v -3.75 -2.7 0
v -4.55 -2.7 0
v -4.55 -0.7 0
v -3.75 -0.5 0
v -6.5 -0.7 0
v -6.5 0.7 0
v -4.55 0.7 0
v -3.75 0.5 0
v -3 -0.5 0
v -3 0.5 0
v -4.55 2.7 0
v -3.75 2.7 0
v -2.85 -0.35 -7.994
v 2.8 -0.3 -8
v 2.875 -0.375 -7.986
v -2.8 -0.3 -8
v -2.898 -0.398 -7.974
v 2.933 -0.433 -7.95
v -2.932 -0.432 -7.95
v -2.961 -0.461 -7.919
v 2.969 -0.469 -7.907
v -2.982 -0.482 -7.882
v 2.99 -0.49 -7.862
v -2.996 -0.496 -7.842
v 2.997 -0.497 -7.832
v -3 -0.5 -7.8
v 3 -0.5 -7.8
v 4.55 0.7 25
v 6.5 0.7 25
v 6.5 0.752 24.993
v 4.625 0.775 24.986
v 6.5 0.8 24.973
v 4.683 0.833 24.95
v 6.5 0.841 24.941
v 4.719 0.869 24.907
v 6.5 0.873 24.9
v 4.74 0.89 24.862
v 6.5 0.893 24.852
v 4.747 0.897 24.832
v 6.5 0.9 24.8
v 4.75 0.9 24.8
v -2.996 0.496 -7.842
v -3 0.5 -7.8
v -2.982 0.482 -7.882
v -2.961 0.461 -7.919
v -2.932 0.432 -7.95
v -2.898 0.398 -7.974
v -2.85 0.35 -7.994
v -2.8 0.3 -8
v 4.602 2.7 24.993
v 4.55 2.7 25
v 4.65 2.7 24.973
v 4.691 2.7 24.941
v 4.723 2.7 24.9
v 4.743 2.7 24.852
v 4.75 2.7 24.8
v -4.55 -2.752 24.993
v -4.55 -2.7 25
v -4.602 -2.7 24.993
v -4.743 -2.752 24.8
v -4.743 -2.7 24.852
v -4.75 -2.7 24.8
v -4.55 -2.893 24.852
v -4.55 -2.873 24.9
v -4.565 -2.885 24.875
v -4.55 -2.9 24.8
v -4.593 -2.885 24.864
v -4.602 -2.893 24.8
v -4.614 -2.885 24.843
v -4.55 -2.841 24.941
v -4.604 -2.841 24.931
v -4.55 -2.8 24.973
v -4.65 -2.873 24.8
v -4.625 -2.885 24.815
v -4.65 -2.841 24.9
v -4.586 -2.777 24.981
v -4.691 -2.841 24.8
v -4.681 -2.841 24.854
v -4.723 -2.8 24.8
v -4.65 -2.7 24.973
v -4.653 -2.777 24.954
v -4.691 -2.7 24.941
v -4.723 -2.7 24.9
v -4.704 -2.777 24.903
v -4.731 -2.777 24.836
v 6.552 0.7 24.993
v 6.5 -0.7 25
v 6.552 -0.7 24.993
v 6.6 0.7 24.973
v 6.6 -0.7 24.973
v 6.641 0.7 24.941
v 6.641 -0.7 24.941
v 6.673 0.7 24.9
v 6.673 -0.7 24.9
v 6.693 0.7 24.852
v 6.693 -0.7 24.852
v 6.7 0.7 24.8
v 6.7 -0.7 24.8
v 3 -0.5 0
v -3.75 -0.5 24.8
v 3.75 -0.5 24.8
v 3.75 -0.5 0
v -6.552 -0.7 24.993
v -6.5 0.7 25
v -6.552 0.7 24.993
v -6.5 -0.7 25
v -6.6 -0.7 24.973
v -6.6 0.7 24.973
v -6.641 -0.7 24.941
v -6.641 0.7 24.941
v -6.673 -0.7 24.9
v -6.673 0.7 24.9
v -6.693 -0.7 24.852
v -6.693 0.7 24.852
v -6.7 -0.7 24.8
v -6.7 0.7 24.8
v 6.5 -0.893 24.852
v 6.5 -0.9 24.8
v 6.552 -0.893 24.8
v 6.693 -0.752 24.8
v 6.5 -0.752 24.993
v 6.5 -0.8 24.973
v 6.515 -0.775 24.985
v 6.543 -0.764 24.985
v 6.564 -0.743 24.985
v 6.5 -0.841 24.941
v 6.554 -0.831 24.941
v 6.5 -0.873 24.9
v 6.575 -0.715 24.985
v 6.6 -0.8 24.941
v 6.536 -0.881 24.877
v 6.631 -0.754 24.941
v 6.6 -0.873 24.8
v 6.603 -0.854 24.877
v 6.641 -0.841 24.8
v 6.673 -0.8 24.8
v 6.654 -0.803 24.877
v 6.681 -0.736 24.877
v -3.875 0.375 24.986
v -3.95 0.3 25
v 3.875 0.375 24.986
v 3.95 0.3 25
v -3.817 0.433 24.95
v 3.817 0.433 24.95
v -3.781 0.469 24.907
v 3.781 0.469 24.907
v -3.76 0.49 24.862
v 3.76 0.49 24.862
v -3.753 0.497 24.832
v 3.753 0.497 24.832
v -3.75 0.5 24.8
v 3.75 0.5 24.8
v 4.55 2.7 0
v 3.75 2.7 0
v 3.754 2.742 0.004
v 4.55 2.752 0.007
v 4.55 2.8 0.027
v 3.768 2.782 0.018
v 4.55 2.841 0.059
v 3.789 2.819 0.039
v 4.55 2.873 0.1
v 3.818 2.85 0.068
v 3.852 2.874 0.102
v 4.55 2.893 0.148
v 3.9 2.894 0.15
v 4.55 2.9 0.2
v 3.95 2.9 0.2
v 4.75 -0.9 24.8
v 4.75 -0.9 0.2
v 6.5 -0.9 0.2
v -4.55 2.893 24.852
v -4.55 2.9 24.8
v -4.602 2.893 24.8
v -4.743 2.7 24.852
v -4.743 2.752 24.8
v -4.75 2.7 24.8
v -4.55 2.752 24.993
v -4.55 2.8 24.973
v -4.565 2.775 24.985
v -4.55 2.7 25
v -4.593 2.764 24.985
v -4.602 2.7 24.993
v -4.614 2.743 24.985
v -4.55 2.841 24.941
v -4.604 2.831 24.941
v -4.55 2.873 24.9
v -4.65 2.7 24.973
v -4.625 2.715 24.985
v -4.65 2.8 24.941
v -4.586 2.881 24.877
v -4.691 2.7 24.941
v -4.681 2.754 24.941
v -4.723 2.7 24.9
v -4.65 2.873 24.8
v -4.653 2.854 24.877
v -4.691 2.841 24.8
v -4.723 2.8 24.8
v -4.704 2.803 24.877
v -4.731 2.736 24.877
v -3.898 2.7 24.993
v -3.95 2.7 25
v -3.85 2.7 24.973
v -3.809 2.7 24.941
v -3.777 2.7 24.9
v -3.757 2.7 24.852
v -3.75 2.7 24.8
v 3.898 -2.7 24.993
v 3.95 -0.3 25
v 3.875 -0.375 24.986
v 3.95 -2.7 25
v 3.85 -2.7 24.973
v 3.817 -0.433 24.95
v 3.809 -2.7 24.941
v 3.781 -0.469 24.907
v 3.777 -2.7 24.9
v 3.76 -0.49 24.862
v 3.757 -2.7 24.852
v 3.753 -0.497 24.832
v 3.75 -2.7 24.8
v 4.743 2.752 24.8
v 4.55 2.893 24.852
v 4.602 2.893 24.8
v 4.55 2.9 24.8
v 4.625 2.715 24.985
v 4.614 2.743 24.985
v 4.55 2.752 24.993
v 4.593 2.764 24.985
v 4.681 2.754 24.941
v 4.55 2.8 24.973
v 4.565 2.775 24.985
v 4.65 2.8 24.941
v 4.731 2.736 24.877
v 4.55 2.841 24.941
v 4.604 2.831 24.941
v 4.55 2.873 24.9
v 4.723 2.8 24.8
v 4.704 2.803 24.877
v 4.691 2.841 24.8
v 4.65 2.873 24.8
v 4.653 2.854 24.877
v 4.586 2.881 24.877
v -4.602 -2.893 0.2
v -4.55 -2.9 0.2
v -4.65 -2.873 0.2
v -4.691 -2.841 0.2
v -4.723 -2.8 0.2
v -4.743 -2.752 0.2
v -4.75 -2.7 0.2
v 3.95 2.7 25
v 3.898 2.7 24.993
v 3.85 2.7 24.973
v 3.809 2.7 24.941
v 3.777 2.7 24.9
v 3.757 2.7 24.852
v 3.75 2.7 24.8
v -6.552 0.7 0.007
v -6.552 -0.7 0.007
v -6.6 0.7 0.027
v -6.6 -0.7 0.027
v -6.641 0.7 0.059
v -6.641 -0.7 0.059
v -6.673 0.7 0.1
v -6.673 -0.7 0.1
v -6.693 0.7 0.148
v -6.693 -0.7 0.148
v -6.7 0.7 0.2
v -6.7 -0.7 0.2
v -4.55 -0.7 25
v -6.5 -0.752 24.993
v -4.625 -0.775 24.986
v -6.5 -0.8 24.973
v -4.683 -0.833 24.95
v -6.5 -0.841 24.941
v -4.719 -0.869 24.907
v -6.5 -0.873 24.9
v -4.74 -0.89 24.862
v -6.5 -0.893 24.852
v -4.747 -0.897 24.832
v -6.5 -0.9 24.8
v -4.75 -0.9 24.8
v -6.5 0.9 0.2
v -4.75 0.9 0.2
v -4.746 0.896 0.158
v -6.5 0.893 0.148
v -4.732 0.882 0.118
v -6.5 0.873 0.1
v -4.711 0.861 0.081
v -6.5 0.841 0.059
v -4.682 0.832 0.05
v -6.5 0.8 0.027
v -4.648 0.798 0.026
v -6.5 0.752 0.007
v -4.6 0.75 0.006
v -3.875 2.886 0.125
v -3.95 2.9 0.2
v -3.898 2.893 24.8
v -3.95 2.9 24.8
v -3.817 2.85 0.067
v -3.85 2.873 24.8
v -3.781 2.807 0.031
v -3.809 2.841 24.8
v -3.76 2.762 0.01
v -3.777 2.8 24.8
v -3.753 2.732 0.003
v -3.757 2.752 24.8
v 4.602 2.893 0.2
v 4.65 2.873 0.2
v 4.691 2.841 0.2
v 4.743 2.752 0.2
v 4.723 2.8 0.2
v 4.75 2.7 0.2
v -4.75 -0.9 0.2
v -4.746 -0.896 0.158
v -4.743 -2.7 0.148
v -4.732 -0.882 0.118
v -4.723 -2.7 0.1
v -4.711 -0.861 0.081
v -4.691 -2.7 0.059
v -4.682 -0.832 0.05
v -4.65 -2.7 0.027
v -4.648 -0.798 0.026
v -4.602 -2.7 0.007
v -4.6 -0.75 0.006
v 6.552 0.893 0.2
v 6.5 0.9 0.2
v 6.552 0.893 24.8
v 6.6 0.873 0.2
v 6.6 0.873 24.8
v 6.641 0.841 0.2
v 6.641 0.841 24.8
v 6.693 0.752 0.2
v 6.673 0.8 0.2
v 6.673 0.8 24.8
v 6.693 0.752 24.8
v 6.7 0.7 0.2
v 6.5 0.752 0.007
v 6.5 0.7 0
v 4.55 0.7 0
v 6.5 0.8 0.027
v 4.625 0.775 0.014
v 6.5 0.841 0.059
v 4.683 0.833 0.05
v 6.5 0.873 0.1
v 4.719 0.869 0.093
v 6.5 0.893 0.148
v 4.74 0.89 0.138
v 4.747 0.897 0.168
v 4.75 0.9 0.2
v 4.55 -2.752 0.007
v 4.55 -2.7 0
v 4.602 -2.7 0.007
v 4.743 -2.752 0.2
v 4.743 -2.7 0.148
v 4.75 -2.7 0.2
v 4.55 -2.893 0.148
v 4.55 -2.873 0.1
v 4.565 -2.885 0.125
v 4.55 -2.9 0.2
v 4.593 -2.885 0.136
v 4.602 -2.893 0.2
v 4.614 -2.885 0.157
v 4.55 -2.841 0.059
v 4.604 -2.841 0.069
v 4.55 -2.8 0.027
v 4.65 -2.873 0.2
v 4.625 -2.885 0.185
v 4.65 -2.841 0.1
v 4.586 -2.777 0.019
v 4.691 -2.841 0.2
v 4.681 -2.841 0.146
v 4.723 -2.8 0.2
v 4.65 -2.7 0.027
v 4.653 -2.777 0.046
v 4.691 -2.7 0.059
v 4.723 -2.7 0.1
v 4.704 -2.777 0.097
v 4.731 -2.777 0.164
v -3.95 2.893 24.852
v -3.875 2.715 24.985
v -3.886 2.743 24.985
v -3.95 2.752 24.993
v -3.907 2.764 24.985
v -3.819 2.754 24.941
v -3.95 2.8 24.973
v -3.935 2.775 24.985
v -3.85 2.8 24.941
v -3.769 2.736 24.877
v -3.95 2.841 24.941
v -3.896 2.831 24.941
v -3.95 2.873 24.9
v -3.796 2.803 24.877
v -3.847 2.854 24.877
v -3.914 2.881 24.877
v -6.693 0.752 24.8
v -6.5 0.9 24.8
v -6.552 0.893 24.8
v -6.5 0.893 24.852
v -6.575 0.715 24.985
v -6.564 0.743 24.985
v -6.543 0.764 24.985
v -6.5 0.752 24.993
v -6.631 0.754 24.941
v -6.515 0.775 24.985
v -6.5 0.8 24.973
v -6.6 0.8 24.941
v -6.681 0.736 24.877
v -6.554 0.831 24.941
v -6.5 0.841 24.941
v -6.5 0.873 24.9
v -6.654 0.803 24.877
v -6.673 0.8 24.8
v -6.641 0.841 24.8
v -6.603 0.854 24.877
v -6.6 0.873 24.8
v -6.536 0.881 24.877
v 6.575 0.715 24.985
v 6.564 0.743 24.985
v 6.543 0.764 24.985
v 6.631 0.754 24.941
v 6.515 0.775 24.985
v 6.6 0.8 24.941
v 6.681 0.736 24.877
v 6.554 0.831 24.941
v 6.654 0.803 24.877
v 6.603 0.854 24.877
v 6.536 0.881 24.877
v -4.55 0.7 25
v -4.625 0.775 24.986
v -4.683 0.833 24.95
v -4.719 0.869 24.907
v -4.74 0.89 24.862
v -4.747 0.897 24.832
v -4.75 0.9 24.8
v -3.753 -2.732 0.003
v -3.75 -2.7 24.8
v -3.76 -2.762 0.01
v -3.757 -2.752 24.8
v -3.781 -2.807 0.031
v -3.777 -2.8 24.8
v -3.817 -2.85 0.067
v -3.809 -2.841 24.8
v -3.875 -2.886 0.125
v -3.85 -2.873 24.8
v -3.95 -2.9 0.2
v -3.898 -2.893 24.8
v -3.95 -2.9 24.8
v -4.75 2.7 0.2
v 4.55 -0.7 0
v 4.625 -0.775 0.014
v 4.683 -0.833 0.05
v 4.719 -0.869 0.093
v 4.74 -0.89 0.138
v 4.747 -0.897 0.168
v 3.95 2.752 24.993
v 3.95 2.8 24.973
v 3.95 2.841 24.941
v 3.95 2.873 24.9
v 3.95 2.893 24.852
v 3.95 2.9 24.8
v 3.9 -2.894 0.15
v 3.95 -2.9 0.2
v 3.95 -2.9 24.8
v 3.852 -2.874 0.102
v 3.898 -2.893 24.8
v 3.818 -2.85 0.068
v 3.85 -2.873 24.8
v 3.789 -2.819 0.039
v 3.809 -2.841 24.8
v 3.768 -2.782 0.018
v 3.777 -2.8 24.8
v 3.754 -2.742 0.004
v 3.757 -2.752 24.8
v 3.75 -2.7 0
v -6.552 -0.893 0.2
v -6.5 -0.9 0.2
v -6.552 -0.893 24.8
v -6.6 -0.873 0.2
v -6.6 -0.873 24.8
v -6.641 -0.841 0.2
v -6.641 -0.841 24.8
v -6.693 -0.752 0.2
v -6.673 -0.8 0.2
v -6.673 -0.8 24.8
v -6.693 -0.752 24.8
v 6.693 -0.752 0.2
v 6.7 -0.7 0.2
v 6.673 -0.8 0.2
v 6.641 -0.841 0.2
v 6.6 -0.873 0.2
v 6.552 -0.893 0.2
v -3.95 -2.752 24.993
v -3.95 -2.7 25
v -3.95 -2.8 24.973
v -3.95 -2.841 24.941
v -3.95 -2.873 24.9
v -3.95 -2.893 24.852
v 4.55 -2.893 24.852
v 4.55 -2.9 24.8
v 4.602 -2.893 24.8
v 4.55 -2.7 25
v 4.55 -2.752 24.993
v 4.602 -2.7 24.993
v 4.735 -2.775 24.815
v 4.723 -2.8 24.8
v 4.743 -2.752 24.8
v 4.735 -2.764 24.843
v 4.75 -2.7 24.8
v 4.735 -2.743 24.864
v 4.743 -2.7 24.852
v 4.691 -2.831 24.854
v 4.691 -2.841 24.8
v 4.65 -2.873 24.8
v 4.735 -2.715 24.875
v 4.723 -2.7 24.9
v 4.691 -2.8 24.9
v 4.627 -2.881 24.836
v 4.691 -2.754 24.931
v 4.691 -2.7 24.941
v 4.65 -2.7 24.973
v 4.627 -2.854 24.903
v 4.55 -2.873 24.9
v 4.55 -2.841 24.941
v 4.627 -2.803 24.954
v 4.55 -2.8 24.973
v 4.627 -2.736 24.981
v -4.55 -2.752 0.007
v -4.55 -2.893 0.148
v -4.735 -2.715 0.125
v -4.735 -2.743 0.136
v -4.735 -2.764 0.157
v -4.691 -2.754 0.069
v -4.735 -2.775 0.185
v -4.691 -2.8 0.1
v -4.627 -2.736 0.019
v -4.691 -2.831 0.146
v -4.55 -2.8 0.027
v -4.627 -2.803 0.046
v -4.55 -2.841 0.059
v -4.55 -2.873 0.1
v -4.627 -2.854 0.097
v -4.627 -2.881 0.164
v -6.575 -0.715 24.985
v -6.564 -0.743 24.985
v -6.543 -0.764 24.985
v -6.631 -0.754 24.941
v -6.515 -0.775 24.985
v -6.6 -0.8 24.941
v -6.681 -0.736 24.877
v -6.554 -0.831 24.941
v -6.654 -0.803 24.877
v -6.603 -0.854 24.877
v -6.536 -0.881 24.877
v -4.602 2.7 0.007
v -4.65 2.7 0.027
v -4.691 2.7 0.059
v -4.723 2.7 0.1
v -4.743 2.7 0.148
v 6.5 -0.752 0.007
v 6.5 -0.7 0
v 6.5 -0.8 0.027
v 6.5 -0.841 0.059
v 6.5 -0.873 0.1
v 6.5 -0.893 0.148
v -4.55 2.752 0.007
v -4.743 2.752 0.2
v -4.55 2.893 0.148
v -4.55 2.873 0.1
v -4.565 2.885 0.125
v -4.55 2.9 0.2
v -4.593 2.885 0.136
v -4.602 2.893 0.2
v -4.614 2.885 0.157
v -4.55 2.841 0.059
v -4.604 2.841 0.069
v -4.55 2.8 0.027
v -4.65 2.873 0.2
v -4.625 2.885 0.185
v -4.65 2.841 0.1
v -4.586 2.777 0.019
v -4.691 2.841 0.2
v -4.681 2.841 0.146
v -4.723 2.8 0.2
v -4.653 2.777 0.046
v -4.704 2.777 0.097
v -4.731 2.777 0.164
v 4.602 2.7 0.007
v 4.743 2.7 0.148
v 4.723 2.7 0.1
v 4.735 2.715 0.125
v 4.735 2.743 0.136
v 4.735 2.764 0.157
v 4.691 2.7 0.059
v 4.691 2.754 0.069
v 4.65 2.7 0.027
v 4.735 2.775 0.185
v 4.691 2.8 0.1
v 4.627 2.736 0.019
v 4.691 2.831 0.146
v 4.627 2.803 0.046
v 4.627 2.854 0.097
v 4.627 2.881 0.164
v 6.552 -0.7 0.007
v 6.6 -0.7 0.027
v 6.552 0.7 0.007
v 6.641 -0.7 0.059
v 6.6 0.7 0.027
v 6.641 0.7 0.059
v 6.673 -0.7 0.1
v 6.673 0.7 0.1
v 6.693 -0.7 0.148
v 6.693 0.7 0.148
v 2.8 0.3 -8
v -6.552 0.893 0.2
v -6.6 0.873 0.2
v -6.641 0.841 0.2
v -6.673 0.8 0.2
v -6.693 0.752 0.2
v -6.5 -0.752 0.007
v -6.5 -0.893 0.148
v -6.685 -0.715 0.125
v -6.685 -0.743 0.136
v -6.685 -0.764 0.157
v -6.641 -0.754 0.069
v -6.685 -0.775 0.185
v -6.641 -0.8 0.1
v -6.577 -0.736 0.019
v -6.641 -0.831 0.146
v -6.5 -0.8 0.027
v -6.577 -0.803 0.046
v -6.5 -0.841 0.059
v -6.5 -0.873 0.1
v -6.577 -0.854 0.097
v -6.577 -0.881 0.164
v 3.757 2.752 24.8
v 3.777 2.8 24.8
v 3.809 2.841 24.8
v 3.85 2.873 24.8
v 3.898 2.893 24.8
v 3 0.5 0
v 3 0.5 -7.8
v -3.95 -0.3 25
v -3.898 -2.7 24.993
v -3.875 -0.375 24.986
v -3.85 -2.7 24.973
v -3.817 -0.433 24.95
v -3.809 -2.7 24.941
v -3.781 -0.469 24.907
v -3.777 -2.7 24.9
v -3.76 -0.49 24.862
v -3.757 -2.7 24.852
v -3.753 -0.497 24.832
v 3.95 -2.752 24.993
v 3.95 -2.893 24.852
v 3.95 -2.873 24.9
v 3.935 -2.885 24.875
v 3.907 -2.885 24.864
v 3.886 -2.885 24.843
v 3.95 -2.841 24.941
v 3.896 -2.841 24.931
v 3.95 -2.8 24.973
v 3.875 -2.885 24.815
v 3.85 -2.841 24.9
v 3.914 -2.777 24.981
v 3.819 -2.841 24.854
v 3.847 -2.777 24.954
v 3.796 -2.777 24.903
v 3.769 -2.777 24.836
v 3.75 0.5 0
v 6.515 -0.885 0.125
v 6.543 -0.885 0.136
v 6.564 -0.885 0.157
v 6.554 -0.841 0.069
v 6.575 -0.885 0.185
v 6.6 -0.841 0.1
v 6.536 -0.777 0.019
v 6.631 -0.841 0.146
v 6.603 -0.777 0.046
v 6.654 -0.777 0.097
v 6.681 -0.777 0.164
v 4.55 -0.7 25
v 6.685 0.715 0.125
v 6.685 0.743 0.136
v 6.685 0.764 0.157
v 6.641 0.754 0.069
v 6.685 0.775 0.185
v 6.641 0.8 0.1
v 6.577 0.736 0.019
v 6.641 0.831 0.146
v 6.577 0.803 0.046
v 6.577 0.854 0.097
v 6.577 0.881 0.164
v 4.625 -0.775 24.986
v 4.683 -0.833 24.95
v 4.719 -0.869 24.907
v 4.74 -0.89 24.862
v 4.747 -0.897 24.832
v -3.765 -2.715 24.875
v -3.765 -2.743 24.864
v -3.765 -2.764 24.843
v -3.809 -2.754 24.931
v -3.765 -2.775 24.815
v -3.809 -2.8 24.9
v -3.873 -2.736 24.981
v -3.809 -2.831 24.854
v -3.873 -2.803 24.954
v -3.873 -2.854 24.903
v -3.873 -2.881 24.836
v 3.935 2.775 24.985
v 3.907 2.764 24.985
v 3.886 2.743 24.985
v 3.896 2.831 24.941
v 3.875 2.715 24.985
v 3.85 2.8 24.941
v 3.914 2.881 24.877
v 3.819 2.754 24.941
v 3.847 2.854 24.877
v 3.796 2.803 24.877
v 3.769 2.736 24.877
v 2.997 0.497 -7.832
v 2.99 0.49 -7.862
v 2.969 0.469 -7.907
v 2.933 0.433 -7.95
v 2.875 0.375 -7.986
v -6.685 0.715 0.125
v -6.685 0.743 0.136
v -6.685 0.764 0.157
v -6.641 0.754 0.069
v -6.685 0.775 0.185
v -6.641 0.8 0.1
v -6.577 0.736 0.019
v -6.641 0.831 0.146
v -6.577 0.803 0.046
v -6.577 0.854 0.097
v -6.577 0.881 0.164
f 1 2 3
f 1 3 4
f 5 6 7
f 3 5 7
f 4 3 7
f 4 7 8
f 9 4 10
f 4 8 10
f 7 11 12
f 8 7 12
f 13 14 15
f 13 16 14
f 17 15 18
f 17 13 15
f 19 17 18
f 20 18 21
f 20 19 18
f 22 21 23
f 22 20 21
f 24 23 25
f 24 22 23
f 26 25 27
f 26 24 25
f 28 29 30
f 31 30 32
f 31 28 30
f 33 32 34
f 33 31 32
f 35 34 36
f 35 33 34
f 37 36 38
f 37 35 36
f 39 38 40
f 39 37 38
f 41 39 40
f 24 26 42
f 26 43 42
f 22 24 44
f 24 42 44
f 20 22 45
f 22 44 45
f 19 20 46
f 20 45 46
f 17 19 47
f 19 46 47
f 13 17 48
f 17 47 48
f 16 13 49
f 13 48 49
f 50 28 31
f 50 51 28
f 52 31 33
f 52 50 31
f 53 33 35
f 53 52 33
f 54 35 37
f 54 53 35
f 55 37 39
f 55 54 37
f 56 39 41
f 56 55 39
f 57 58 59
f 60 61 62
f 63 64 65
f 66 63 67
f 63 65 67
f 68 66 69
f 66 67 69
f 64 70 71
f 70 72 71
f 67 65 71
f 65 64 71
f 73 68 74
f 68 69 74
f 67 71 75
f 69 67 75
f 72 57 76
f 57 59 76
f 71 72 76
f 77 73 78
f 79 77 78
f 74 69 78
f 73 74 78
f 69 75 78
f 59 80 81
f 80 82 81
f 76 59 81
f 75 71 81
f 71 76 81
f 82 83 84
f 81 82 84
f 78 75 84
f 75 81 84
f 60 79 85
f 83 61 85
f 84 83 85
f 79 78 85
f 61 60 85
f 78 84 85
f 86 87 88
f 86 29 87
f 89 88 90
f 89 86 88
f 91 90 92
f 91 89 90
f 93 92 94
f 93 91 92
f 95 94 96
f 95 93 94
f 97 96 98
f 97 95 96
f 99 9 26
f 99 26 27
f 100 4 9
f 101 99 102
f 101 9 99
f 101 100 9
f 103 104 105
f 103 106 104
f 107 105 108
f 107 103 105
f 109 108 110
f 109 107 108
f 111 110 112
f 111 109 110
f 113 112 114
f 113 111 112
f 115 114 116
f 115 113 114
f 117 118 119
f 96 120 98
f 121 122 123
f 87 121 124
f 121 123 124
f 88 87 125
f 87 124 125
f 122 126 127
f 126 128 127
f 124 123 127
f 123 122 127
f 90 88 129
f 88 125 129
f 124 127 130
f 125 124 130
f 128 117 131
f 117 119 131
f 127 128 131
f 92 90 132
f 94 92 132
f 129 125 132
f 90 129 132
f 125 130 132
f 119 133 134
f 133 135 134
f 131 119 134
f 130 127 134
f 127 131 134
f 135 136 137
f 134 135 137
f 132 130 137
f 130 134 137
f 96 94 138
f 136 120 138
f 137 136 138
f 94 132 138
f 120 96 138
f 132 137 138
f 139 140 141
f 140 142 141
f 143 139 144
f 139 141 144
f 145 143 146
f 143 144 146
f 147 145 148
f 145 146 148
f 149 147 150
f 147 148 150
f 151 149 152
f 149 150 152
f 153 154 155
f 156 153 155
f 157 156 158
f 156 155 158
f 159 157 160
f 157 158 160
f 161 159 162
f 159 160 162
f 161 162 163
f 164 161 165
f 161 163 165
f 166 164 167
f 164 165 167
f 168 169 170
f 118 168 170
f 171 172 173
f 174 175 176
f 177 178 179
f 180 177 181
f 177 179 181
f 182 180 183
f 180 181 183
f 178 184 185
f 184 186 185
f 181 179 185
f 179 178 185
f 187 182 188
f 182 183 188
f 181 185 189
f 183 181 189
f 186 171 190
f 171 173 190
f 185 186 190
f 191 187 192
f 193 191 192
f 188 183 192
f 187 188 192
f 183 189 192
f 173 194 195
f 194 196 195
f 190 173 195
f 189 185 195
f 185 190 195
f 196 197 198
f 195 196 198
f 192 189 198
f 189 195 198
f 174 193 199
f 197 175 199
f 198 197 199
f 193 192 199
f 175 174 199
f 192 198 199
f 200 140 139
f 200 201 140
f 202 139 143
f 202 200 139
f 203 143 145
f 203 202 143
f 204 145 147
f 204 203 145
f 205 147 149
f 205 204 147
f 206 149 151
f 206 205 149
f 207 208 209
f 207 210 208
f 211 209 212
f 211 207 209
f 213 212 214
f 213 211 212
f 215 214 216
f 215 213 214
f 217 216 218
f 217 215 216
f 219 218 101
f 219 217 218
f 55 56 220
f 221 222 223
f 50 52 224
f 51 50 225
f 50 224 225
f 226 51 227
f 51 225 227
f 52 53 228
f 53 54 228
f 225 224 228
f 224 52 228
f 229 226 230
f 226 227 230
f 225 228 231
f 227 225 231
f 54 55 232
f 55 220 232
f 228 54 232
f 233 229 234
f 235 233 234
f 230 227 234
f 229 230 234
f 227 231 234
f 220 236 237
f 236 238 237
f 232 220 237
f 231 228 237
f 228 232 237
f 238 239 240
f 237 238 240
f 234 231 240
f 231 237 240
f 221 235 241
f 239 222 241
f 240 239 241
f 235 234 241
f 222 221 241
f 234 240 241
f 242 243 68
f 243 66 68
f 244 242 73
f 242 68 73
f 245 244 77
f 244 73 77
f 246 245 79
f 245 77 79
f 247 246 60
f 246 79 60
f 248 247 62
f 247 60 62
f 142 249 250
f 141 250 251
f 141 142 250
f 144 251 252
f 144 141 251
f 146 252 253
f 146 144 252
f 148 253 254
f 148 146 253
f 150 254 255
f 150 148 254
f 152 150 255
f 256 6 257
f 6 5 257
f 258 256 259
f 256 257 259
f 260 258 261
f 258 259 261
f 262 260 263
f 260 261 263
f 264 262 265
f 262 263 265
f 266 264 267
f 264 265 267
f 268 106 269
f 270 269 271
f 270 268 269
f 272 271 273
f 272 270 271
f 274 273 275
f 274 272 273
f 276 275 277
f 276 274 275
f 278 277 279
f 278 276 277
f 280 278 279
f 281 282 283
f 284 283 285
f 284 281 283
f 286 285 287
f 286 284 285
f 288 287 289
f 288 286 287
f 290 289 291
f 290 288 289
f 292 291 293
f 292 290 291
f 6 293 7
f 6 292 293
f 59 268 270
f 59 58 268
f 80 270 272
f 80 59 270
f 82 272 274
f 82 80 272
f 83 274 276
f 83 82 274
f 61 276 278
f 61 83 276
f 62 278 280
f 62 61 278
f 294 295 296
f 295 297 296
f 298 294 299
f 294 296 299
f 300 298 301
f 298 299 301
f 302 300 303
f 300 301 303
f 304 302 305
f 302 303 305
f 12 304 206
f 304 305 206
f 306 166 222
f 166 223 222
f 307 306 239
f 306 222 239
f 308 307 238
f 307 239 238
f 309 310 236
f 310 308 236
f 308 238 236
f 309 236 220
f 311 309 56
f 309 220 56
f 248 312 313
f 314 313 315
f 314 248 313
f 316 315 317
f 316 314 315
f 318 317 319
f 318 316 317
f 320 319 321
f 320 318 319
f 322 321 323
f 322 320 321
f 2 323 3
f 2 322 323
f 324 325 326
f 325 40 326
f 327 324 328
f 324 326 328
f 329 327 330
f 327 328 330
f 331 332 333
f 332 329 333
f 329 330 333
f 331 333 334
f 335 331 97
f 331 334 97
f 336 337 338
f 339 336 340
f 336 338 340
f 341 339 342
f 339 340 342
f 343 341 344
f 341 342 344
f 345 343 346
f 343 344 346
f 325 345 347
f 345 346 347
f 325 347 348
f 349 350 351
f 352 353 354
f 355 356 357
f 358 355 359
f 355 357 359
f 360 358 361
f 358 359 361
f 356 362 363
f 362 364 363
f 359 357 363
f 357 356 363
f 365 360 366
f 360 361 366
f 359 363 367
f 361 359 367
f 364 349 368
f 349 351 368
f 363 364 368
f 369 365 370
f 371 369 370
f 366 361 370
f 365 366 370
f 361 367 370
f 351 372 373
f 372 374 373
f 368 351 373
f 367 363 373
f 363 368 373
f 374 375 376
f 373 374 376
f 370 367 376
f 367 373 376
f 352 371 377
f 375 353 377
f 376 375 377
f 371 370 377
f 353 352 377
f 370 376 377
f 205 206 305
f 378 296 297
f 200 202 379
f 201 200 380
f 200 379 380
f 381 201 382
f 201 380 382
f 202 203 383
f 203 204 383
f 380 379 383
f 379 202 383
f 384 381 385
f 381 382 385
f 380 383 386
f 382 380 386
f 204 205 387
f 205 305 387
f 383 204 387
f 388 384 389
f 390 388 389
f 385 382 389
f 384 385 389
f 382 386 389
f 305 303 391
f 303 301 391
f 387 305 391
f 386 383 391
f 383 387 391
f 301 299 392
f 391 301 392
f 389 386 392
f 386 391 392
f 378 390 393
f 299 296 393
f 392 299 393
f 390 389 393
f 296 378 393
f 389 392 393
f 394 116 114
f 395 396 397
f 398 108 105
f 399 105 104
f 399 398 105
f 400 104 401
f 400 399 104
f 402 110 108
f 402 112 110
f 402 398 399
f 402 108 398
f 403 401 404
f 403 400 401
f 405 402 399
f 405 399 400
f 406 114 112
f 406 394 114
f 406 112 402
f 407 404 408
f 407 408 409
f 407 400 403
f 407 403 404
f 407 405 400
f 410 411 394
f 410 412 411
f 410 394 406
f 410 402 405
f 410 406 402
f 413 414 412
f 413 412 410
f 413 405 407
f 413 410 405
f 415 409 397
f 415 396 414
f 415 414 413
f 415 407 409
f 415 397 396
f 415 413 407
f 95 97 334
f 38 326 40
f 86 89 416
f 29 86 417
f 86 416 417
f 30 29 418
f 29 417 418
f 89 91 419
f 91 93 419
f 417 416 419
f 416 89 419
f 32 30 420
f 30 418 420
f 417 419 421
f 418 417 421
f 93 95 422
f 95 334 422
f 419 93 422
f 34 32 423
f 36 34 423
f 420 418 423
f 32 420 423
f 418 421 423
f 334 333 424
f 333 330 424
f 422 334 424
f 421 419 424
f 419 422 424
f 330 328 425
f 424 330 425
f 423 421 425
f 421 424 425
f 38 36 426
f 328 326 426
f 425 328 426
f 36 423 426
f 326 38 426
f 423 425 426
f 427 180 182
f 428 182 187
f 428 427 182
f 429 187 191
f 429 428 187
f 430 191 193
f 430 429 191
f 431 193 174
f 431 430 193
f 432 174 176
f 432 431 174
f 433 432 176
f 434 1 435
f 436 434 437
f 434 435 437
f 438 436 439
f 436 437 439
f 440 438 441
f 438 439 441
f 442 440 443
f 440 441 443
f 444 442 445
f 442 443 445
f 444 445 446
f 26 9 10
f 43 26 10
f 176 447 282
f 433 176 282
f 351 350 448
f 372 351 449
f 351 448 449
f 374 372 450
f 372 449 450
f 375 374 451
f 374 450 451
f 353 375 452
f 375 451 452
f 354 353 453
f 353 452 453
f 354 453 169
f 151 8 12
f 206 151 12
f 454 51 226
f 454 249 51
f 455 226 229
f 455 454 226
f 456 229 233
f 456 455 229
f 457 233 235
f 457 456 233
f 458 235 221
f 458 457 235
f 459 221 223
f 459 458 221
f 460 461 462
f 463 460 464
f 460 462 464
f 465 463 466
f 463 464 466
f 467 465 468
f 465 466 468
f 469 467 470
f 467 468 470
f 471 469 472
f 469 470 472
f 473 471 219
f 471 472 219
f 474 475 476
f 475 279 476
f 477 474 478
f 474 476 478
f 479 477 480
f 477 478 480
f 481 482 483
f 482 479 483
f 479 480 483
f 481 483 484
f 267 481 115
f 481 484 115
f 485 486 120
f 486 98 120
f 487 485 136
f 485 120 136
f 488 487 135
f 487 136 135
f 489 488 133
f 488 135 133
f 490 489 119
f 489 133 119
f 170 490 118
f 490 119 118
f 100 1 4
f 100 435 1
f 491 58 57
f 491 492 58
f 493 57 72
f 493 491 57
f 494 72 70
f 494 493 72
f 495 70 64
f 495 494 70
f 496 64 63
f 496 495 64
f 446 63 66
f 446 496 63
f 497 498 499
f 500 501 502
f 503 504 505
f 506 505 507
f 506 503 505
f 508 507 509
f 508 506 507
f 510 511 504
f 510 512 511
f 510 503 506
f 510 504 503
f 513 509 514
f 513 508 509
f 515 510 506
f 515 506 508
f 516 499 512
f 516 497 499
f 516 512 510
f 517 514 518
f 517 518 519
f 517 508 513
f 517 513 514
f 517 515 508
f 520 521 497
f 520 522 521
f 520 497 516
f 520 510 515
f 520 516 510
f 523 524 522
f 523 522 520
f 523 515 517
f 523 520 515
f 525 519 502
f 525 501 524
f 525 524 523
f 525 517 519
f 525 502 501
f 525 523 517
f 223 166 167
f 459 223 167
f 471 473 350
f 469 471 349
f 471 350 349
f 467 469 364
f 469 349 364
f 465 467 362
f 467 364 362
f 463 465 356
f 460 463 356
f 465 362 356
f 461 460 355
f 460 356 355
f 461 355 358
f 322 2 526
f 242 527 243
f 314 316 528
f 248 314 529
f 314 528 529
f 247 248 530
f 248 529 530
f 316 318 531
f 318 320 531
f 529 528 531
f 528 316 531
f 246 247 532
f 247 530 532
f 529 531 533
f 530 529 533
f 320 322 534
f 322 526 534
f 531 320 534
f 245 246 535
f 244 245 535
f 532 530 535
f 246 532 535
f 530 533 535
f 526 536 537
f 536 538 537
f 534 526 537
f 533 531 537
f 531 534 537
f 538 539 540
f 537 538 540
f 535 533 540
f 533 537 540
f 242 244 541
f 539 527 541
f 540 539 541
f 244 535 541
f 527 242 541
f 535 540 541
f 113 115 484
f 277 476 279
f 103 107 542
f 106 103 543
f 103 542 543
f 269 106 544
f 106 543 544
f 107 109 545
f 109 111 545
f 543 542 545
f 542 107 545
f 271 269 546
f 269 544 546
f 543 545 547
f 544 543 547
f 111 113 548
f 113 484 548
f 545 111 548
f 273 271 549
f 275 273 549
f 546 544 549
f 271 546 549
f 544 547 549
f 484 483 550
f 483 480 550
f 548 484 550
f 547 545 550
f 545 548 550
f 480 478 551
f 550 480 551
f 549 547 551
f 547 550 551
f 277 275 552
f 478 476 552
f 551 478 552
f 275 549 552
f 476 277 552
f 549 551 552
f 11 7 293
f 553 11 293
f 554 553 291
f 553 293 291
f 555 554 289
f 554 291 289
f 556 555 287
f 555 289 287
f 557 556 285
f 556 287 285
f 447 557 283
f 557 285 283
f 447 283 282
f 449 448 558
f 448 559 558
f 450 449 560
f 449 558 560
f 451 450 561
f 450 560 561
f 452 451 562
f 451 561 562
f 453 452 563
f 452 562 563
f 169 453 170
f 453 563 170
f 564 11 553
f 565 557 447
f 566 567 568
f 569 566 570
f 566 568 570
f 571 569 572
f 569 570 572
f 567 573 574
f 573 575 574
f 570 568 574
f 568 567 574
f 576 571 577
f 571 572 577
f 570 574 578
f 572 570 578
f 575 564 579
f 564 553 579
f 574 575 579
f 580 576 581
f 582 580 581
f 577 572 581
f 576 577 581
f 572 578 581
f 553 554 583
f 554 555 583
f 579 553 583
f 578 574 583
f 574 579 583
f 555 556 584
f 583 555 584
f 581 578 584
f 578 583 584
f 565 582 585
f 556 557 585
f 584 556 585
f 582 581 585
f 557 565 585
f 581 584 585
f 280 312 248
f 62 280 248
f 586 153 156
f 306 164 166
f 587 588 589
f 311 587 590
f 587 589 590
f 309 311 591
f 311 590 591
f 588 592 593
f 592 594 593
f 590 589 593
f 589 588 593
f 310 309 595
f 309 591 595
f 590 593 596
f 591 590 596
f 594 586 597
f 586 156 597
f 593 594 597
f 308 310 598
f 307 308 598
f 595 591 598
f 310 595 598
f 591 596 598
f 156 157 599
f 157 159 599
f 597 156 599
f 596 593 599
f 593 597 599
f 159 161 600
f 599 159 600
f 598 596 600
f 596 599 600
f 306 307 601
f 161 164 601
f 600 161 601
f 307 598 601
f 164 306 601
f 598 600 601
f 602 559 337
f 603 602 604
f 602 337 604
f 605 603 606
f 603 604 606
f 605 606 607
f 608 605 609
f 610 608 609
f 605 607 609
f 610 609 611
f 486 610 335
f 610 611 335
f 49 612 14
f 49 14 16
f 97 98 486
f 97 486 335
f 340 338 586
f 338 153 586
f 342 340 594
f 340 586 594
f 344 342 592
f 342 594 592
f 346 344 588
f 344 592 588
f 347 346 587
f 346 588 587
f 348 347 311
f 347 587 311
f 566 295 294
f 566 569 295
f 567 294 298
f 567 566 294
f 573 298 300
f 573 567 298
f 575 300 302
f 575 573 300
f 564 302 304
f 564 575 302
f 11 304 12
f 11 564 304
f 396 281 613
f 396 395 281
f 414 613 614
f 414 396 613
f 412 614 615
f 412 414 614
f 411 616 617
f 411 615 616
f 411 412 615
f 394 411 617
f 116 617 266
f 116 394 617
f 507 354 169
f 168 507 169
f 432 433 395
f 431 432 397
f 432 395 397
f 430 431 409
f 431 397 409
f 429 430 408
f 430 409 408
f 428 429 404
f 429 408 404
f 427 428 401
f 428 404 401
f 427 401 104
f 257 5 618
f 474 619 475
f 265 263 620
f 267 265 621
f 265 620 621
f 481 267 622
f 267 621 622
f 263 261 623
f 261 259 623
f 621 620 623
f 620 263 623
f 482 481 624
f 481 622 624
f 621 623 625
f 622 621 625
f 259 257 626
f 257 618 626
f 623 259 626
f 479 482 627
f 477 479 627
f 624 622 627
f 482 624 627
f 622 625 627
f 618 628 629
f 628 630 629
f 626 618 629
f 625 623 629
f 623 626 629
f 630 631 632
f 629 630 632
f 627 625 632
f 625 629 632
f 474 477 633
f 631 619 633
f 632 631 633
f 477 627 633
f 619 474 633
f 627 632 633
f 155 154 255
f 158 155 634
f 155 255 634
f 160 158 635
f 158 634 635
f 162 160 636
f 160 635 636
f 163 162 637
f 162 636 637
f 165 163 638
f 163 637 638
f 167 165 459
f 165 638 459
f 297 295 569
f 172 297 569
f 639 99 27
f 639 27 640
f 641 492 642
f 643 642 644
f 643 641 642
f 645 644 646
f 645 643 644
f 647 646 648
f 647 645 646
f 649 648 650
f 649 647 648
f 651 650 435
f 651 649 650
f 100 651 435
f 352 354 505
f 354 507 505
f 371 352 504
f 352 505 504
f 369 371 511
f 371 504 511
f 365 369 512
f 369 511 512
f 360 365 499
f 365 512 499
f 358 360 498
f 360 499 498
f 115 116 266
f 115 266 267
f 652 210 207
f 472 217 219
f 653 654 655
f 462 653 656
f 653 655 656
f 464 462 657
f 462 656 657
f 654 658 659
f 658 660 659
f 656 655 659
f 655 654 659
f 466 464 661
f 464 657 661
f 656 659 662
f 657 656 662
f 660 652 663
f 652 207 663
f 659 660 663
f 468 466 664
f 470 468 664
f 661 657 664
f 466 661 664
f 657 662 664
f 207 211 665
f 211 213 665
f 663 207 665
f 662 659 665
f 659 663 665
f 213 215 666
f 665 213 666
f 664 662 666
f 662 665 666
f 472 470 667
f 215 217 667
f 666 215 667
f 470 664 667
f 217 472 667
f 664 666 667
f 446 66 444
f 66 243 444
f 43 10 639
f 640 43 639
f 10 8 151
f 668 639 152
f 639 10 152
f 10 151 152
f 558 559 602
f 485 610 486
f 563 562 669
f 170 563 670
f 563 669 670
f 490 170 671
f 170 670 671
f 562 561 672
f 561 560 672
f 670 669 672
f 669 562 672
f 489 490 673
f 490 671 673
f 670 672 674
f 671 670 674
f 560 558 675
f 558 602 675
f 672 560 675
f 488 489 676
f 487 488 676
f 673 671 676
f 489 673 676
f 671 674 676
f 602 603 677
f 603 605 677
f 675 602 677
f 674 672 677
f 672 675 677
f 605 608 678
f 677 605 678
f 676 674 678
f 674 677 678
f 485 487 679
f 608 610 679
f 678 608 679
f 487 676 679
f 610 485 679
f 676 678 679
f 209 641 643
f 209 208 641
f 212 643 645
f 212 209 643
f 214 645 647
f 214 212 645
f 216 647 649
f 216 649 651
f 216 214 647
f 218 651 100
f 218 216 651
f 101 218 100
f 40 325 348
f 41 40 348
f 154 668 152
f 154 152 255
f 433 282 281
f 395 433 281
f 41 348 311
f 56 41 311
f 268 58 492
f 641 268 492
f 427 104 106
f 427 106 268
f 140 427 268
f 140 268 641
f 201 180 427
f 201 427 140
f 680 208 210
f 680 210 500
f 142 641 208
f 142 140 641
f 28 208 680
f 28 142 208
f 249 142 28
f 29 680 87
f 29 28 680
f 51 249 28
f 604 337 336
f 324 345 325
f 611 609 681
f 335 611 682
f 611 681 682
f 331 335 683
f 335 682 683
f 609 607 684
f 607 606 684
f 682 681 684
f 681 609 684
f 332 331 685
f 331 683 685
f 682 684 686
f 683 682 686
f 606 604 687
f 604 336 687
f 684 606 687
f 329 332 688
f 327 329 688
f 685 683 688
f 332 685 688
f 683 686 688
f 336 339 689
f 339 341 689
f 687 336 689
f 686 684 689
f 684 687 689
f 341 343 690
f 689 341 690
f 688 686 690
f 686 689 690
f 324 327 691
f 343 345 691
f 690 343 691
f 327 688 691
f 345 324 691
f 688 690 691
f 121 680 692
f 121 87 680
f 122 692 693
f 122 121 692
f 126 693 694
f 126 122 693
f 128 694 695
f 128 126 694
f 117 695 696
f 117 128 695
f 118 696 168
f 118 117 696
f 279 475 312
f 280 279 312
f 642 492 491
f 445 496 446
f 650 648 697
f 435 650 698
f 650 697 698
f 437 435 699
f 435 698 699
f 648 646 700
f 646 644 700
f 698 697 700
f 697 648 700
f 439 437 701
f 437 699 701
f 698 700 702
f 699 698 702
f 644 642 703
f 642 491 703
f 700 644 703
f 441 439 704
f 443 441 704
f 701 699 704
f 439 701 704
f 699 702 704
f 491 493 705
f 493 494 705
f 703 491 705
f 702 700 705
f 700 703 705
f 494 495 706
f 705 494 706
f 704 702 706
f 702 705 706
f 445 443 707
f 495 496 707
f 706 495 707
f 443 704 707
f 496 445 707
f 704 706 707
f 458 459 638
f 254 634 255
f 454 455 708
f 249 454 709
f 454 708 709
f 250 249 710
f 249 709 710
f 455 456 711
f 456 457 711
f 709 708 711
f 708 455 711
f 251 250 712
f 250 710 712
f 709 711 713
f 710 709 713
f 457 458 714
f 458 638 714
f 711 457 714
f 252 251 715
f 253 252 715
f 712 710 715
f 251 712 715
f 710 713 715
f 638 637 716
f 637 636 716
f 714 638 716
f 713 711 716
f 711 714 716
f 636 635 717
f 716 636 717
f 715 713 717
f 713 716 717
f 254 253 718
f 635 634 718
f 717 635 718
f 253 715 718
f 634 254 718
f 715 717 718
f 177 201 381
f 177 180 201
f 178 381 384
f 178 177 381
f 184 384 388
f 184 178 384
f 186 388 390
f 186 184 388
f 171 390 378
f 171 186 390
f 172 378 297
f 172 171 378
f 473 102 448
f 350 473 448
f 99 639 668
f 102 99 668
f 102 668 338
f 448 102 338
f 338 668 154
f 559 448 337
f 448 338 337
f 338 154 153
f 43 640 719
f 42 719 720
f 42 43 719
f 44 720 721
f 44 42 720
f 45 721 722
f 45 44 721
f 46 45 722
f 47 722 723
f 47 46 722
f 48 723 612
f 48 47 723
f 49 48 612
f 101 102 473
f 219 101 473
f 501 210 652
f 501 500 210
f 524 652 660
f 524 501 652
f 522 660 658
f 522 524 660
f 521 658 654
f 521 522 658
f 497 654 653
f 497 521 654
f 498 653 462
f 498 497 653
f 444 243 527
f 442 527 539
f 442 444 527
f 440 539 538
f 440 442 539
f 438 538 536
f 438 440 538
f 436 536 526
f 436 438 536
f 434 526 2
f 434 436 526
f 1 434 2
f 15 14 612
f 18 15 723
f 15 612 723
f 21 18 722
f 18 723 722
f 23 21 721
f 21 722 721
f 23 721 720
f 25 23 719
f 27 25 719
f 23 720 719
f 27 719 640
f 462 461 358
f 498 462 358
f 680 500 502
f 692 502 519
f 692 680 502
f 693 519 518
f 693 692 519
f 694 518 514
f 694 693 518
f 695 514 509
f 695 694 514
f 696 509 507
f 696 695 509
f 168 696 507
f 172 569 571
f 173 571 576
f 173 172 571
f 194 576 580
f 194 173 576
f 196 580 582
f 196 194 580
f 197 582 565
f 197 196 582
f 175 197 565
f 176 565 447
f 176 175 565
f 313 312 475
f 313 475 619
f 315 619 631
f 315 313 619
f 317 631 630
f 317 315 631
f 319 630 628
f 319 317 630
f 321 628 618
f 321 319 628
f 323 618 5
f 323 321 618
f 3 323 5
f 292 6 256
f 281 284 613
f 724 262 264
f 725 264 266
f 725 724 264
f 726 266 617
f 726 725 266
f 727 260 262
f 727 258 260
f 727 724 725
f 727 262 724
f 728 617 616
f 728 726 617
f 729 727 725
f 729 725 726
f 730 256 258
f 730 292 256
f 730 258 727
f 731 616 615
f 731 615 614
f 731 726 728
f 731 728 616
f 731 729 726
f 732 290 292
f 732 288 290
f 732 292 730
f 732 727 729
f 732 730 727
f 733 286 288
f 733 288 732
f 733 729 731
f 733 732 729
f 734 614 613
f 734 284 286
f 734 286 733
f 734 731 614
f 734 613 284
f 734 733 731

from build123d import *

# Parameters (mm, degrees)
AUFSATZ_LINEAR_AUSTRAGEN1_DEPTH = 25
SKIZZE2_W                       = 6
SKIZZE2_H                       = 1.8
AUFSATZ_LINEAR_AUSTRAGEN2_DEPTH = 8
SKIZZE3_W                       = 7.5
SKIZZE3_H                       = 0.4
SCHNITT_LINEAR_AUSTRAGEN1_DEPTH = 34
VERRUNDUNG1_R                   = 0.2


with BuildPart() as part:
    # Skizze1 → Aufsatz-Linear austragen1 (new body)
    with BuildSketch(Plane.XY):
        Polygon((-4.75, 0.9), (-6.7, 0.9), (-6.7, -0.9), (-4.75, -0.9), (-4.75, -2.9), (-3.75, -2.9), (-3.75, -0.9), (3.75, -0.9), (3.75, -2.9), (4.75, -2.9), (4.75, -0.9), (6.7, -0.9), (6.7, 0.9), (4.75, 0.9), (4.75, 2.9), (3.75, 2.9), (3.75, 0.9), (-3.75, 0.9), (-3.75, 2.9), (-4.75, 2.9), align=None)
    extrude(amount=AUFSATZ_LINEAR_AUSTRAGEN1_DEPTH)

    # Skizze2 → Aufsatz-Linear austragen2 (add)
    with BuildSketch(Plane(origin=(0, 0, 0), x_dir=(-1, 0, 0), z_dir=(0, 0, -1))):
        Rectangle(SKIZZE2_W, SKIZZE2_H)
    extrude(amount=AUFSATZ_LINEAR_AUSTRAGEN2_DEPTH)

    # Skizze3 → Schnitt-Linear austragen1 (cut, through all)
    with BuildSketch(Plane.XY.offset(25)):
        with Locations((0, -0.7)):
            Rectangle(SKIZZE3_W, SKIZZE3_H)
        with Locations((0, 0.7)):
            Rectangle(SKIZZE3_W, SKIZZE3_H)
    extrude(amount=-SCHNITT_LINEAR_AUSTRAGEN1_DEPTH, mode=Mode.SUBTRACT)

    # Verrundung1
    verrundung1_edges = [part.edges().sort_by_distance(p)[0] for p in [
        (0, 0.5, 25),
        (-4.75, -1.9, 25),
        (-4.25, -2.9, 25),
        (-5.725, 0.9, 0),
        (-4.75, 1.9, 0),
        (-4.25, 2.9, 0),
        (-3.75, -1.7, 25),
        (4.25, 2.9, 0),
        (4.75, 1.9, 0),
        (5.725, 0.9, 0),
        (6.7, 0, 0),
        (5.725, -0.9, 0),
        (4.75, -1.9, 0),
        (4.25, -2.9, 0),
        (-4.25, -2.9, 0),
        (-4.75, -1.9, 0),
        (-5.725, -0.9, 0),
        (-6.7, 0, 0),
        (3.75, -1.7, 25),
        (4.25, -2.9, 25),
        (-6.7, 0.9, 12.5),
        (-4.75, 2.9, 12.5),
        (-3.75, 2.9, 12.5),
        (3.75, 2.9, 12.5),
        (4.75, 2.9, 12.5),
        (6.7, 0.9, 12.5),
        (6.7, -0.9, 12.5),
        (4.75, -2.9, 12.5),
        (3.75, -2.9, 12.5),
        (-3.75, -2.9, 12.5),
        (-4.75, -2.9, 12.5),
        (-6.7, -0.9, 12.5),
        (4.75, -1.9, 25),
        (5.725, -0.9, 25),
        (6.7, 0, 25),
        (5.725, 0.9, 25),
        (-6.7, 0, 25),
        (4.75, 1.9, 25),
        (4.25, 2.9, 25),
        (3.75, 1.7, 25),
        (-3.75, 1.7, 25),
        (3, 0, -8),
        (-3, 0, -8),
        (-4.25, 2.9, 25),
        (0, 0.5, -8),
        (0, -0.5, -8),
        (-4.75, 1.9, 25),
        (-5.725, 0.9, 25),
        (0, -0.5, 25),
        (-5.725, -0.9, 25),
    ]]
    fillet(verrundung1_edges, radius=VERRUNDUNG1_R)


solid = part.part
